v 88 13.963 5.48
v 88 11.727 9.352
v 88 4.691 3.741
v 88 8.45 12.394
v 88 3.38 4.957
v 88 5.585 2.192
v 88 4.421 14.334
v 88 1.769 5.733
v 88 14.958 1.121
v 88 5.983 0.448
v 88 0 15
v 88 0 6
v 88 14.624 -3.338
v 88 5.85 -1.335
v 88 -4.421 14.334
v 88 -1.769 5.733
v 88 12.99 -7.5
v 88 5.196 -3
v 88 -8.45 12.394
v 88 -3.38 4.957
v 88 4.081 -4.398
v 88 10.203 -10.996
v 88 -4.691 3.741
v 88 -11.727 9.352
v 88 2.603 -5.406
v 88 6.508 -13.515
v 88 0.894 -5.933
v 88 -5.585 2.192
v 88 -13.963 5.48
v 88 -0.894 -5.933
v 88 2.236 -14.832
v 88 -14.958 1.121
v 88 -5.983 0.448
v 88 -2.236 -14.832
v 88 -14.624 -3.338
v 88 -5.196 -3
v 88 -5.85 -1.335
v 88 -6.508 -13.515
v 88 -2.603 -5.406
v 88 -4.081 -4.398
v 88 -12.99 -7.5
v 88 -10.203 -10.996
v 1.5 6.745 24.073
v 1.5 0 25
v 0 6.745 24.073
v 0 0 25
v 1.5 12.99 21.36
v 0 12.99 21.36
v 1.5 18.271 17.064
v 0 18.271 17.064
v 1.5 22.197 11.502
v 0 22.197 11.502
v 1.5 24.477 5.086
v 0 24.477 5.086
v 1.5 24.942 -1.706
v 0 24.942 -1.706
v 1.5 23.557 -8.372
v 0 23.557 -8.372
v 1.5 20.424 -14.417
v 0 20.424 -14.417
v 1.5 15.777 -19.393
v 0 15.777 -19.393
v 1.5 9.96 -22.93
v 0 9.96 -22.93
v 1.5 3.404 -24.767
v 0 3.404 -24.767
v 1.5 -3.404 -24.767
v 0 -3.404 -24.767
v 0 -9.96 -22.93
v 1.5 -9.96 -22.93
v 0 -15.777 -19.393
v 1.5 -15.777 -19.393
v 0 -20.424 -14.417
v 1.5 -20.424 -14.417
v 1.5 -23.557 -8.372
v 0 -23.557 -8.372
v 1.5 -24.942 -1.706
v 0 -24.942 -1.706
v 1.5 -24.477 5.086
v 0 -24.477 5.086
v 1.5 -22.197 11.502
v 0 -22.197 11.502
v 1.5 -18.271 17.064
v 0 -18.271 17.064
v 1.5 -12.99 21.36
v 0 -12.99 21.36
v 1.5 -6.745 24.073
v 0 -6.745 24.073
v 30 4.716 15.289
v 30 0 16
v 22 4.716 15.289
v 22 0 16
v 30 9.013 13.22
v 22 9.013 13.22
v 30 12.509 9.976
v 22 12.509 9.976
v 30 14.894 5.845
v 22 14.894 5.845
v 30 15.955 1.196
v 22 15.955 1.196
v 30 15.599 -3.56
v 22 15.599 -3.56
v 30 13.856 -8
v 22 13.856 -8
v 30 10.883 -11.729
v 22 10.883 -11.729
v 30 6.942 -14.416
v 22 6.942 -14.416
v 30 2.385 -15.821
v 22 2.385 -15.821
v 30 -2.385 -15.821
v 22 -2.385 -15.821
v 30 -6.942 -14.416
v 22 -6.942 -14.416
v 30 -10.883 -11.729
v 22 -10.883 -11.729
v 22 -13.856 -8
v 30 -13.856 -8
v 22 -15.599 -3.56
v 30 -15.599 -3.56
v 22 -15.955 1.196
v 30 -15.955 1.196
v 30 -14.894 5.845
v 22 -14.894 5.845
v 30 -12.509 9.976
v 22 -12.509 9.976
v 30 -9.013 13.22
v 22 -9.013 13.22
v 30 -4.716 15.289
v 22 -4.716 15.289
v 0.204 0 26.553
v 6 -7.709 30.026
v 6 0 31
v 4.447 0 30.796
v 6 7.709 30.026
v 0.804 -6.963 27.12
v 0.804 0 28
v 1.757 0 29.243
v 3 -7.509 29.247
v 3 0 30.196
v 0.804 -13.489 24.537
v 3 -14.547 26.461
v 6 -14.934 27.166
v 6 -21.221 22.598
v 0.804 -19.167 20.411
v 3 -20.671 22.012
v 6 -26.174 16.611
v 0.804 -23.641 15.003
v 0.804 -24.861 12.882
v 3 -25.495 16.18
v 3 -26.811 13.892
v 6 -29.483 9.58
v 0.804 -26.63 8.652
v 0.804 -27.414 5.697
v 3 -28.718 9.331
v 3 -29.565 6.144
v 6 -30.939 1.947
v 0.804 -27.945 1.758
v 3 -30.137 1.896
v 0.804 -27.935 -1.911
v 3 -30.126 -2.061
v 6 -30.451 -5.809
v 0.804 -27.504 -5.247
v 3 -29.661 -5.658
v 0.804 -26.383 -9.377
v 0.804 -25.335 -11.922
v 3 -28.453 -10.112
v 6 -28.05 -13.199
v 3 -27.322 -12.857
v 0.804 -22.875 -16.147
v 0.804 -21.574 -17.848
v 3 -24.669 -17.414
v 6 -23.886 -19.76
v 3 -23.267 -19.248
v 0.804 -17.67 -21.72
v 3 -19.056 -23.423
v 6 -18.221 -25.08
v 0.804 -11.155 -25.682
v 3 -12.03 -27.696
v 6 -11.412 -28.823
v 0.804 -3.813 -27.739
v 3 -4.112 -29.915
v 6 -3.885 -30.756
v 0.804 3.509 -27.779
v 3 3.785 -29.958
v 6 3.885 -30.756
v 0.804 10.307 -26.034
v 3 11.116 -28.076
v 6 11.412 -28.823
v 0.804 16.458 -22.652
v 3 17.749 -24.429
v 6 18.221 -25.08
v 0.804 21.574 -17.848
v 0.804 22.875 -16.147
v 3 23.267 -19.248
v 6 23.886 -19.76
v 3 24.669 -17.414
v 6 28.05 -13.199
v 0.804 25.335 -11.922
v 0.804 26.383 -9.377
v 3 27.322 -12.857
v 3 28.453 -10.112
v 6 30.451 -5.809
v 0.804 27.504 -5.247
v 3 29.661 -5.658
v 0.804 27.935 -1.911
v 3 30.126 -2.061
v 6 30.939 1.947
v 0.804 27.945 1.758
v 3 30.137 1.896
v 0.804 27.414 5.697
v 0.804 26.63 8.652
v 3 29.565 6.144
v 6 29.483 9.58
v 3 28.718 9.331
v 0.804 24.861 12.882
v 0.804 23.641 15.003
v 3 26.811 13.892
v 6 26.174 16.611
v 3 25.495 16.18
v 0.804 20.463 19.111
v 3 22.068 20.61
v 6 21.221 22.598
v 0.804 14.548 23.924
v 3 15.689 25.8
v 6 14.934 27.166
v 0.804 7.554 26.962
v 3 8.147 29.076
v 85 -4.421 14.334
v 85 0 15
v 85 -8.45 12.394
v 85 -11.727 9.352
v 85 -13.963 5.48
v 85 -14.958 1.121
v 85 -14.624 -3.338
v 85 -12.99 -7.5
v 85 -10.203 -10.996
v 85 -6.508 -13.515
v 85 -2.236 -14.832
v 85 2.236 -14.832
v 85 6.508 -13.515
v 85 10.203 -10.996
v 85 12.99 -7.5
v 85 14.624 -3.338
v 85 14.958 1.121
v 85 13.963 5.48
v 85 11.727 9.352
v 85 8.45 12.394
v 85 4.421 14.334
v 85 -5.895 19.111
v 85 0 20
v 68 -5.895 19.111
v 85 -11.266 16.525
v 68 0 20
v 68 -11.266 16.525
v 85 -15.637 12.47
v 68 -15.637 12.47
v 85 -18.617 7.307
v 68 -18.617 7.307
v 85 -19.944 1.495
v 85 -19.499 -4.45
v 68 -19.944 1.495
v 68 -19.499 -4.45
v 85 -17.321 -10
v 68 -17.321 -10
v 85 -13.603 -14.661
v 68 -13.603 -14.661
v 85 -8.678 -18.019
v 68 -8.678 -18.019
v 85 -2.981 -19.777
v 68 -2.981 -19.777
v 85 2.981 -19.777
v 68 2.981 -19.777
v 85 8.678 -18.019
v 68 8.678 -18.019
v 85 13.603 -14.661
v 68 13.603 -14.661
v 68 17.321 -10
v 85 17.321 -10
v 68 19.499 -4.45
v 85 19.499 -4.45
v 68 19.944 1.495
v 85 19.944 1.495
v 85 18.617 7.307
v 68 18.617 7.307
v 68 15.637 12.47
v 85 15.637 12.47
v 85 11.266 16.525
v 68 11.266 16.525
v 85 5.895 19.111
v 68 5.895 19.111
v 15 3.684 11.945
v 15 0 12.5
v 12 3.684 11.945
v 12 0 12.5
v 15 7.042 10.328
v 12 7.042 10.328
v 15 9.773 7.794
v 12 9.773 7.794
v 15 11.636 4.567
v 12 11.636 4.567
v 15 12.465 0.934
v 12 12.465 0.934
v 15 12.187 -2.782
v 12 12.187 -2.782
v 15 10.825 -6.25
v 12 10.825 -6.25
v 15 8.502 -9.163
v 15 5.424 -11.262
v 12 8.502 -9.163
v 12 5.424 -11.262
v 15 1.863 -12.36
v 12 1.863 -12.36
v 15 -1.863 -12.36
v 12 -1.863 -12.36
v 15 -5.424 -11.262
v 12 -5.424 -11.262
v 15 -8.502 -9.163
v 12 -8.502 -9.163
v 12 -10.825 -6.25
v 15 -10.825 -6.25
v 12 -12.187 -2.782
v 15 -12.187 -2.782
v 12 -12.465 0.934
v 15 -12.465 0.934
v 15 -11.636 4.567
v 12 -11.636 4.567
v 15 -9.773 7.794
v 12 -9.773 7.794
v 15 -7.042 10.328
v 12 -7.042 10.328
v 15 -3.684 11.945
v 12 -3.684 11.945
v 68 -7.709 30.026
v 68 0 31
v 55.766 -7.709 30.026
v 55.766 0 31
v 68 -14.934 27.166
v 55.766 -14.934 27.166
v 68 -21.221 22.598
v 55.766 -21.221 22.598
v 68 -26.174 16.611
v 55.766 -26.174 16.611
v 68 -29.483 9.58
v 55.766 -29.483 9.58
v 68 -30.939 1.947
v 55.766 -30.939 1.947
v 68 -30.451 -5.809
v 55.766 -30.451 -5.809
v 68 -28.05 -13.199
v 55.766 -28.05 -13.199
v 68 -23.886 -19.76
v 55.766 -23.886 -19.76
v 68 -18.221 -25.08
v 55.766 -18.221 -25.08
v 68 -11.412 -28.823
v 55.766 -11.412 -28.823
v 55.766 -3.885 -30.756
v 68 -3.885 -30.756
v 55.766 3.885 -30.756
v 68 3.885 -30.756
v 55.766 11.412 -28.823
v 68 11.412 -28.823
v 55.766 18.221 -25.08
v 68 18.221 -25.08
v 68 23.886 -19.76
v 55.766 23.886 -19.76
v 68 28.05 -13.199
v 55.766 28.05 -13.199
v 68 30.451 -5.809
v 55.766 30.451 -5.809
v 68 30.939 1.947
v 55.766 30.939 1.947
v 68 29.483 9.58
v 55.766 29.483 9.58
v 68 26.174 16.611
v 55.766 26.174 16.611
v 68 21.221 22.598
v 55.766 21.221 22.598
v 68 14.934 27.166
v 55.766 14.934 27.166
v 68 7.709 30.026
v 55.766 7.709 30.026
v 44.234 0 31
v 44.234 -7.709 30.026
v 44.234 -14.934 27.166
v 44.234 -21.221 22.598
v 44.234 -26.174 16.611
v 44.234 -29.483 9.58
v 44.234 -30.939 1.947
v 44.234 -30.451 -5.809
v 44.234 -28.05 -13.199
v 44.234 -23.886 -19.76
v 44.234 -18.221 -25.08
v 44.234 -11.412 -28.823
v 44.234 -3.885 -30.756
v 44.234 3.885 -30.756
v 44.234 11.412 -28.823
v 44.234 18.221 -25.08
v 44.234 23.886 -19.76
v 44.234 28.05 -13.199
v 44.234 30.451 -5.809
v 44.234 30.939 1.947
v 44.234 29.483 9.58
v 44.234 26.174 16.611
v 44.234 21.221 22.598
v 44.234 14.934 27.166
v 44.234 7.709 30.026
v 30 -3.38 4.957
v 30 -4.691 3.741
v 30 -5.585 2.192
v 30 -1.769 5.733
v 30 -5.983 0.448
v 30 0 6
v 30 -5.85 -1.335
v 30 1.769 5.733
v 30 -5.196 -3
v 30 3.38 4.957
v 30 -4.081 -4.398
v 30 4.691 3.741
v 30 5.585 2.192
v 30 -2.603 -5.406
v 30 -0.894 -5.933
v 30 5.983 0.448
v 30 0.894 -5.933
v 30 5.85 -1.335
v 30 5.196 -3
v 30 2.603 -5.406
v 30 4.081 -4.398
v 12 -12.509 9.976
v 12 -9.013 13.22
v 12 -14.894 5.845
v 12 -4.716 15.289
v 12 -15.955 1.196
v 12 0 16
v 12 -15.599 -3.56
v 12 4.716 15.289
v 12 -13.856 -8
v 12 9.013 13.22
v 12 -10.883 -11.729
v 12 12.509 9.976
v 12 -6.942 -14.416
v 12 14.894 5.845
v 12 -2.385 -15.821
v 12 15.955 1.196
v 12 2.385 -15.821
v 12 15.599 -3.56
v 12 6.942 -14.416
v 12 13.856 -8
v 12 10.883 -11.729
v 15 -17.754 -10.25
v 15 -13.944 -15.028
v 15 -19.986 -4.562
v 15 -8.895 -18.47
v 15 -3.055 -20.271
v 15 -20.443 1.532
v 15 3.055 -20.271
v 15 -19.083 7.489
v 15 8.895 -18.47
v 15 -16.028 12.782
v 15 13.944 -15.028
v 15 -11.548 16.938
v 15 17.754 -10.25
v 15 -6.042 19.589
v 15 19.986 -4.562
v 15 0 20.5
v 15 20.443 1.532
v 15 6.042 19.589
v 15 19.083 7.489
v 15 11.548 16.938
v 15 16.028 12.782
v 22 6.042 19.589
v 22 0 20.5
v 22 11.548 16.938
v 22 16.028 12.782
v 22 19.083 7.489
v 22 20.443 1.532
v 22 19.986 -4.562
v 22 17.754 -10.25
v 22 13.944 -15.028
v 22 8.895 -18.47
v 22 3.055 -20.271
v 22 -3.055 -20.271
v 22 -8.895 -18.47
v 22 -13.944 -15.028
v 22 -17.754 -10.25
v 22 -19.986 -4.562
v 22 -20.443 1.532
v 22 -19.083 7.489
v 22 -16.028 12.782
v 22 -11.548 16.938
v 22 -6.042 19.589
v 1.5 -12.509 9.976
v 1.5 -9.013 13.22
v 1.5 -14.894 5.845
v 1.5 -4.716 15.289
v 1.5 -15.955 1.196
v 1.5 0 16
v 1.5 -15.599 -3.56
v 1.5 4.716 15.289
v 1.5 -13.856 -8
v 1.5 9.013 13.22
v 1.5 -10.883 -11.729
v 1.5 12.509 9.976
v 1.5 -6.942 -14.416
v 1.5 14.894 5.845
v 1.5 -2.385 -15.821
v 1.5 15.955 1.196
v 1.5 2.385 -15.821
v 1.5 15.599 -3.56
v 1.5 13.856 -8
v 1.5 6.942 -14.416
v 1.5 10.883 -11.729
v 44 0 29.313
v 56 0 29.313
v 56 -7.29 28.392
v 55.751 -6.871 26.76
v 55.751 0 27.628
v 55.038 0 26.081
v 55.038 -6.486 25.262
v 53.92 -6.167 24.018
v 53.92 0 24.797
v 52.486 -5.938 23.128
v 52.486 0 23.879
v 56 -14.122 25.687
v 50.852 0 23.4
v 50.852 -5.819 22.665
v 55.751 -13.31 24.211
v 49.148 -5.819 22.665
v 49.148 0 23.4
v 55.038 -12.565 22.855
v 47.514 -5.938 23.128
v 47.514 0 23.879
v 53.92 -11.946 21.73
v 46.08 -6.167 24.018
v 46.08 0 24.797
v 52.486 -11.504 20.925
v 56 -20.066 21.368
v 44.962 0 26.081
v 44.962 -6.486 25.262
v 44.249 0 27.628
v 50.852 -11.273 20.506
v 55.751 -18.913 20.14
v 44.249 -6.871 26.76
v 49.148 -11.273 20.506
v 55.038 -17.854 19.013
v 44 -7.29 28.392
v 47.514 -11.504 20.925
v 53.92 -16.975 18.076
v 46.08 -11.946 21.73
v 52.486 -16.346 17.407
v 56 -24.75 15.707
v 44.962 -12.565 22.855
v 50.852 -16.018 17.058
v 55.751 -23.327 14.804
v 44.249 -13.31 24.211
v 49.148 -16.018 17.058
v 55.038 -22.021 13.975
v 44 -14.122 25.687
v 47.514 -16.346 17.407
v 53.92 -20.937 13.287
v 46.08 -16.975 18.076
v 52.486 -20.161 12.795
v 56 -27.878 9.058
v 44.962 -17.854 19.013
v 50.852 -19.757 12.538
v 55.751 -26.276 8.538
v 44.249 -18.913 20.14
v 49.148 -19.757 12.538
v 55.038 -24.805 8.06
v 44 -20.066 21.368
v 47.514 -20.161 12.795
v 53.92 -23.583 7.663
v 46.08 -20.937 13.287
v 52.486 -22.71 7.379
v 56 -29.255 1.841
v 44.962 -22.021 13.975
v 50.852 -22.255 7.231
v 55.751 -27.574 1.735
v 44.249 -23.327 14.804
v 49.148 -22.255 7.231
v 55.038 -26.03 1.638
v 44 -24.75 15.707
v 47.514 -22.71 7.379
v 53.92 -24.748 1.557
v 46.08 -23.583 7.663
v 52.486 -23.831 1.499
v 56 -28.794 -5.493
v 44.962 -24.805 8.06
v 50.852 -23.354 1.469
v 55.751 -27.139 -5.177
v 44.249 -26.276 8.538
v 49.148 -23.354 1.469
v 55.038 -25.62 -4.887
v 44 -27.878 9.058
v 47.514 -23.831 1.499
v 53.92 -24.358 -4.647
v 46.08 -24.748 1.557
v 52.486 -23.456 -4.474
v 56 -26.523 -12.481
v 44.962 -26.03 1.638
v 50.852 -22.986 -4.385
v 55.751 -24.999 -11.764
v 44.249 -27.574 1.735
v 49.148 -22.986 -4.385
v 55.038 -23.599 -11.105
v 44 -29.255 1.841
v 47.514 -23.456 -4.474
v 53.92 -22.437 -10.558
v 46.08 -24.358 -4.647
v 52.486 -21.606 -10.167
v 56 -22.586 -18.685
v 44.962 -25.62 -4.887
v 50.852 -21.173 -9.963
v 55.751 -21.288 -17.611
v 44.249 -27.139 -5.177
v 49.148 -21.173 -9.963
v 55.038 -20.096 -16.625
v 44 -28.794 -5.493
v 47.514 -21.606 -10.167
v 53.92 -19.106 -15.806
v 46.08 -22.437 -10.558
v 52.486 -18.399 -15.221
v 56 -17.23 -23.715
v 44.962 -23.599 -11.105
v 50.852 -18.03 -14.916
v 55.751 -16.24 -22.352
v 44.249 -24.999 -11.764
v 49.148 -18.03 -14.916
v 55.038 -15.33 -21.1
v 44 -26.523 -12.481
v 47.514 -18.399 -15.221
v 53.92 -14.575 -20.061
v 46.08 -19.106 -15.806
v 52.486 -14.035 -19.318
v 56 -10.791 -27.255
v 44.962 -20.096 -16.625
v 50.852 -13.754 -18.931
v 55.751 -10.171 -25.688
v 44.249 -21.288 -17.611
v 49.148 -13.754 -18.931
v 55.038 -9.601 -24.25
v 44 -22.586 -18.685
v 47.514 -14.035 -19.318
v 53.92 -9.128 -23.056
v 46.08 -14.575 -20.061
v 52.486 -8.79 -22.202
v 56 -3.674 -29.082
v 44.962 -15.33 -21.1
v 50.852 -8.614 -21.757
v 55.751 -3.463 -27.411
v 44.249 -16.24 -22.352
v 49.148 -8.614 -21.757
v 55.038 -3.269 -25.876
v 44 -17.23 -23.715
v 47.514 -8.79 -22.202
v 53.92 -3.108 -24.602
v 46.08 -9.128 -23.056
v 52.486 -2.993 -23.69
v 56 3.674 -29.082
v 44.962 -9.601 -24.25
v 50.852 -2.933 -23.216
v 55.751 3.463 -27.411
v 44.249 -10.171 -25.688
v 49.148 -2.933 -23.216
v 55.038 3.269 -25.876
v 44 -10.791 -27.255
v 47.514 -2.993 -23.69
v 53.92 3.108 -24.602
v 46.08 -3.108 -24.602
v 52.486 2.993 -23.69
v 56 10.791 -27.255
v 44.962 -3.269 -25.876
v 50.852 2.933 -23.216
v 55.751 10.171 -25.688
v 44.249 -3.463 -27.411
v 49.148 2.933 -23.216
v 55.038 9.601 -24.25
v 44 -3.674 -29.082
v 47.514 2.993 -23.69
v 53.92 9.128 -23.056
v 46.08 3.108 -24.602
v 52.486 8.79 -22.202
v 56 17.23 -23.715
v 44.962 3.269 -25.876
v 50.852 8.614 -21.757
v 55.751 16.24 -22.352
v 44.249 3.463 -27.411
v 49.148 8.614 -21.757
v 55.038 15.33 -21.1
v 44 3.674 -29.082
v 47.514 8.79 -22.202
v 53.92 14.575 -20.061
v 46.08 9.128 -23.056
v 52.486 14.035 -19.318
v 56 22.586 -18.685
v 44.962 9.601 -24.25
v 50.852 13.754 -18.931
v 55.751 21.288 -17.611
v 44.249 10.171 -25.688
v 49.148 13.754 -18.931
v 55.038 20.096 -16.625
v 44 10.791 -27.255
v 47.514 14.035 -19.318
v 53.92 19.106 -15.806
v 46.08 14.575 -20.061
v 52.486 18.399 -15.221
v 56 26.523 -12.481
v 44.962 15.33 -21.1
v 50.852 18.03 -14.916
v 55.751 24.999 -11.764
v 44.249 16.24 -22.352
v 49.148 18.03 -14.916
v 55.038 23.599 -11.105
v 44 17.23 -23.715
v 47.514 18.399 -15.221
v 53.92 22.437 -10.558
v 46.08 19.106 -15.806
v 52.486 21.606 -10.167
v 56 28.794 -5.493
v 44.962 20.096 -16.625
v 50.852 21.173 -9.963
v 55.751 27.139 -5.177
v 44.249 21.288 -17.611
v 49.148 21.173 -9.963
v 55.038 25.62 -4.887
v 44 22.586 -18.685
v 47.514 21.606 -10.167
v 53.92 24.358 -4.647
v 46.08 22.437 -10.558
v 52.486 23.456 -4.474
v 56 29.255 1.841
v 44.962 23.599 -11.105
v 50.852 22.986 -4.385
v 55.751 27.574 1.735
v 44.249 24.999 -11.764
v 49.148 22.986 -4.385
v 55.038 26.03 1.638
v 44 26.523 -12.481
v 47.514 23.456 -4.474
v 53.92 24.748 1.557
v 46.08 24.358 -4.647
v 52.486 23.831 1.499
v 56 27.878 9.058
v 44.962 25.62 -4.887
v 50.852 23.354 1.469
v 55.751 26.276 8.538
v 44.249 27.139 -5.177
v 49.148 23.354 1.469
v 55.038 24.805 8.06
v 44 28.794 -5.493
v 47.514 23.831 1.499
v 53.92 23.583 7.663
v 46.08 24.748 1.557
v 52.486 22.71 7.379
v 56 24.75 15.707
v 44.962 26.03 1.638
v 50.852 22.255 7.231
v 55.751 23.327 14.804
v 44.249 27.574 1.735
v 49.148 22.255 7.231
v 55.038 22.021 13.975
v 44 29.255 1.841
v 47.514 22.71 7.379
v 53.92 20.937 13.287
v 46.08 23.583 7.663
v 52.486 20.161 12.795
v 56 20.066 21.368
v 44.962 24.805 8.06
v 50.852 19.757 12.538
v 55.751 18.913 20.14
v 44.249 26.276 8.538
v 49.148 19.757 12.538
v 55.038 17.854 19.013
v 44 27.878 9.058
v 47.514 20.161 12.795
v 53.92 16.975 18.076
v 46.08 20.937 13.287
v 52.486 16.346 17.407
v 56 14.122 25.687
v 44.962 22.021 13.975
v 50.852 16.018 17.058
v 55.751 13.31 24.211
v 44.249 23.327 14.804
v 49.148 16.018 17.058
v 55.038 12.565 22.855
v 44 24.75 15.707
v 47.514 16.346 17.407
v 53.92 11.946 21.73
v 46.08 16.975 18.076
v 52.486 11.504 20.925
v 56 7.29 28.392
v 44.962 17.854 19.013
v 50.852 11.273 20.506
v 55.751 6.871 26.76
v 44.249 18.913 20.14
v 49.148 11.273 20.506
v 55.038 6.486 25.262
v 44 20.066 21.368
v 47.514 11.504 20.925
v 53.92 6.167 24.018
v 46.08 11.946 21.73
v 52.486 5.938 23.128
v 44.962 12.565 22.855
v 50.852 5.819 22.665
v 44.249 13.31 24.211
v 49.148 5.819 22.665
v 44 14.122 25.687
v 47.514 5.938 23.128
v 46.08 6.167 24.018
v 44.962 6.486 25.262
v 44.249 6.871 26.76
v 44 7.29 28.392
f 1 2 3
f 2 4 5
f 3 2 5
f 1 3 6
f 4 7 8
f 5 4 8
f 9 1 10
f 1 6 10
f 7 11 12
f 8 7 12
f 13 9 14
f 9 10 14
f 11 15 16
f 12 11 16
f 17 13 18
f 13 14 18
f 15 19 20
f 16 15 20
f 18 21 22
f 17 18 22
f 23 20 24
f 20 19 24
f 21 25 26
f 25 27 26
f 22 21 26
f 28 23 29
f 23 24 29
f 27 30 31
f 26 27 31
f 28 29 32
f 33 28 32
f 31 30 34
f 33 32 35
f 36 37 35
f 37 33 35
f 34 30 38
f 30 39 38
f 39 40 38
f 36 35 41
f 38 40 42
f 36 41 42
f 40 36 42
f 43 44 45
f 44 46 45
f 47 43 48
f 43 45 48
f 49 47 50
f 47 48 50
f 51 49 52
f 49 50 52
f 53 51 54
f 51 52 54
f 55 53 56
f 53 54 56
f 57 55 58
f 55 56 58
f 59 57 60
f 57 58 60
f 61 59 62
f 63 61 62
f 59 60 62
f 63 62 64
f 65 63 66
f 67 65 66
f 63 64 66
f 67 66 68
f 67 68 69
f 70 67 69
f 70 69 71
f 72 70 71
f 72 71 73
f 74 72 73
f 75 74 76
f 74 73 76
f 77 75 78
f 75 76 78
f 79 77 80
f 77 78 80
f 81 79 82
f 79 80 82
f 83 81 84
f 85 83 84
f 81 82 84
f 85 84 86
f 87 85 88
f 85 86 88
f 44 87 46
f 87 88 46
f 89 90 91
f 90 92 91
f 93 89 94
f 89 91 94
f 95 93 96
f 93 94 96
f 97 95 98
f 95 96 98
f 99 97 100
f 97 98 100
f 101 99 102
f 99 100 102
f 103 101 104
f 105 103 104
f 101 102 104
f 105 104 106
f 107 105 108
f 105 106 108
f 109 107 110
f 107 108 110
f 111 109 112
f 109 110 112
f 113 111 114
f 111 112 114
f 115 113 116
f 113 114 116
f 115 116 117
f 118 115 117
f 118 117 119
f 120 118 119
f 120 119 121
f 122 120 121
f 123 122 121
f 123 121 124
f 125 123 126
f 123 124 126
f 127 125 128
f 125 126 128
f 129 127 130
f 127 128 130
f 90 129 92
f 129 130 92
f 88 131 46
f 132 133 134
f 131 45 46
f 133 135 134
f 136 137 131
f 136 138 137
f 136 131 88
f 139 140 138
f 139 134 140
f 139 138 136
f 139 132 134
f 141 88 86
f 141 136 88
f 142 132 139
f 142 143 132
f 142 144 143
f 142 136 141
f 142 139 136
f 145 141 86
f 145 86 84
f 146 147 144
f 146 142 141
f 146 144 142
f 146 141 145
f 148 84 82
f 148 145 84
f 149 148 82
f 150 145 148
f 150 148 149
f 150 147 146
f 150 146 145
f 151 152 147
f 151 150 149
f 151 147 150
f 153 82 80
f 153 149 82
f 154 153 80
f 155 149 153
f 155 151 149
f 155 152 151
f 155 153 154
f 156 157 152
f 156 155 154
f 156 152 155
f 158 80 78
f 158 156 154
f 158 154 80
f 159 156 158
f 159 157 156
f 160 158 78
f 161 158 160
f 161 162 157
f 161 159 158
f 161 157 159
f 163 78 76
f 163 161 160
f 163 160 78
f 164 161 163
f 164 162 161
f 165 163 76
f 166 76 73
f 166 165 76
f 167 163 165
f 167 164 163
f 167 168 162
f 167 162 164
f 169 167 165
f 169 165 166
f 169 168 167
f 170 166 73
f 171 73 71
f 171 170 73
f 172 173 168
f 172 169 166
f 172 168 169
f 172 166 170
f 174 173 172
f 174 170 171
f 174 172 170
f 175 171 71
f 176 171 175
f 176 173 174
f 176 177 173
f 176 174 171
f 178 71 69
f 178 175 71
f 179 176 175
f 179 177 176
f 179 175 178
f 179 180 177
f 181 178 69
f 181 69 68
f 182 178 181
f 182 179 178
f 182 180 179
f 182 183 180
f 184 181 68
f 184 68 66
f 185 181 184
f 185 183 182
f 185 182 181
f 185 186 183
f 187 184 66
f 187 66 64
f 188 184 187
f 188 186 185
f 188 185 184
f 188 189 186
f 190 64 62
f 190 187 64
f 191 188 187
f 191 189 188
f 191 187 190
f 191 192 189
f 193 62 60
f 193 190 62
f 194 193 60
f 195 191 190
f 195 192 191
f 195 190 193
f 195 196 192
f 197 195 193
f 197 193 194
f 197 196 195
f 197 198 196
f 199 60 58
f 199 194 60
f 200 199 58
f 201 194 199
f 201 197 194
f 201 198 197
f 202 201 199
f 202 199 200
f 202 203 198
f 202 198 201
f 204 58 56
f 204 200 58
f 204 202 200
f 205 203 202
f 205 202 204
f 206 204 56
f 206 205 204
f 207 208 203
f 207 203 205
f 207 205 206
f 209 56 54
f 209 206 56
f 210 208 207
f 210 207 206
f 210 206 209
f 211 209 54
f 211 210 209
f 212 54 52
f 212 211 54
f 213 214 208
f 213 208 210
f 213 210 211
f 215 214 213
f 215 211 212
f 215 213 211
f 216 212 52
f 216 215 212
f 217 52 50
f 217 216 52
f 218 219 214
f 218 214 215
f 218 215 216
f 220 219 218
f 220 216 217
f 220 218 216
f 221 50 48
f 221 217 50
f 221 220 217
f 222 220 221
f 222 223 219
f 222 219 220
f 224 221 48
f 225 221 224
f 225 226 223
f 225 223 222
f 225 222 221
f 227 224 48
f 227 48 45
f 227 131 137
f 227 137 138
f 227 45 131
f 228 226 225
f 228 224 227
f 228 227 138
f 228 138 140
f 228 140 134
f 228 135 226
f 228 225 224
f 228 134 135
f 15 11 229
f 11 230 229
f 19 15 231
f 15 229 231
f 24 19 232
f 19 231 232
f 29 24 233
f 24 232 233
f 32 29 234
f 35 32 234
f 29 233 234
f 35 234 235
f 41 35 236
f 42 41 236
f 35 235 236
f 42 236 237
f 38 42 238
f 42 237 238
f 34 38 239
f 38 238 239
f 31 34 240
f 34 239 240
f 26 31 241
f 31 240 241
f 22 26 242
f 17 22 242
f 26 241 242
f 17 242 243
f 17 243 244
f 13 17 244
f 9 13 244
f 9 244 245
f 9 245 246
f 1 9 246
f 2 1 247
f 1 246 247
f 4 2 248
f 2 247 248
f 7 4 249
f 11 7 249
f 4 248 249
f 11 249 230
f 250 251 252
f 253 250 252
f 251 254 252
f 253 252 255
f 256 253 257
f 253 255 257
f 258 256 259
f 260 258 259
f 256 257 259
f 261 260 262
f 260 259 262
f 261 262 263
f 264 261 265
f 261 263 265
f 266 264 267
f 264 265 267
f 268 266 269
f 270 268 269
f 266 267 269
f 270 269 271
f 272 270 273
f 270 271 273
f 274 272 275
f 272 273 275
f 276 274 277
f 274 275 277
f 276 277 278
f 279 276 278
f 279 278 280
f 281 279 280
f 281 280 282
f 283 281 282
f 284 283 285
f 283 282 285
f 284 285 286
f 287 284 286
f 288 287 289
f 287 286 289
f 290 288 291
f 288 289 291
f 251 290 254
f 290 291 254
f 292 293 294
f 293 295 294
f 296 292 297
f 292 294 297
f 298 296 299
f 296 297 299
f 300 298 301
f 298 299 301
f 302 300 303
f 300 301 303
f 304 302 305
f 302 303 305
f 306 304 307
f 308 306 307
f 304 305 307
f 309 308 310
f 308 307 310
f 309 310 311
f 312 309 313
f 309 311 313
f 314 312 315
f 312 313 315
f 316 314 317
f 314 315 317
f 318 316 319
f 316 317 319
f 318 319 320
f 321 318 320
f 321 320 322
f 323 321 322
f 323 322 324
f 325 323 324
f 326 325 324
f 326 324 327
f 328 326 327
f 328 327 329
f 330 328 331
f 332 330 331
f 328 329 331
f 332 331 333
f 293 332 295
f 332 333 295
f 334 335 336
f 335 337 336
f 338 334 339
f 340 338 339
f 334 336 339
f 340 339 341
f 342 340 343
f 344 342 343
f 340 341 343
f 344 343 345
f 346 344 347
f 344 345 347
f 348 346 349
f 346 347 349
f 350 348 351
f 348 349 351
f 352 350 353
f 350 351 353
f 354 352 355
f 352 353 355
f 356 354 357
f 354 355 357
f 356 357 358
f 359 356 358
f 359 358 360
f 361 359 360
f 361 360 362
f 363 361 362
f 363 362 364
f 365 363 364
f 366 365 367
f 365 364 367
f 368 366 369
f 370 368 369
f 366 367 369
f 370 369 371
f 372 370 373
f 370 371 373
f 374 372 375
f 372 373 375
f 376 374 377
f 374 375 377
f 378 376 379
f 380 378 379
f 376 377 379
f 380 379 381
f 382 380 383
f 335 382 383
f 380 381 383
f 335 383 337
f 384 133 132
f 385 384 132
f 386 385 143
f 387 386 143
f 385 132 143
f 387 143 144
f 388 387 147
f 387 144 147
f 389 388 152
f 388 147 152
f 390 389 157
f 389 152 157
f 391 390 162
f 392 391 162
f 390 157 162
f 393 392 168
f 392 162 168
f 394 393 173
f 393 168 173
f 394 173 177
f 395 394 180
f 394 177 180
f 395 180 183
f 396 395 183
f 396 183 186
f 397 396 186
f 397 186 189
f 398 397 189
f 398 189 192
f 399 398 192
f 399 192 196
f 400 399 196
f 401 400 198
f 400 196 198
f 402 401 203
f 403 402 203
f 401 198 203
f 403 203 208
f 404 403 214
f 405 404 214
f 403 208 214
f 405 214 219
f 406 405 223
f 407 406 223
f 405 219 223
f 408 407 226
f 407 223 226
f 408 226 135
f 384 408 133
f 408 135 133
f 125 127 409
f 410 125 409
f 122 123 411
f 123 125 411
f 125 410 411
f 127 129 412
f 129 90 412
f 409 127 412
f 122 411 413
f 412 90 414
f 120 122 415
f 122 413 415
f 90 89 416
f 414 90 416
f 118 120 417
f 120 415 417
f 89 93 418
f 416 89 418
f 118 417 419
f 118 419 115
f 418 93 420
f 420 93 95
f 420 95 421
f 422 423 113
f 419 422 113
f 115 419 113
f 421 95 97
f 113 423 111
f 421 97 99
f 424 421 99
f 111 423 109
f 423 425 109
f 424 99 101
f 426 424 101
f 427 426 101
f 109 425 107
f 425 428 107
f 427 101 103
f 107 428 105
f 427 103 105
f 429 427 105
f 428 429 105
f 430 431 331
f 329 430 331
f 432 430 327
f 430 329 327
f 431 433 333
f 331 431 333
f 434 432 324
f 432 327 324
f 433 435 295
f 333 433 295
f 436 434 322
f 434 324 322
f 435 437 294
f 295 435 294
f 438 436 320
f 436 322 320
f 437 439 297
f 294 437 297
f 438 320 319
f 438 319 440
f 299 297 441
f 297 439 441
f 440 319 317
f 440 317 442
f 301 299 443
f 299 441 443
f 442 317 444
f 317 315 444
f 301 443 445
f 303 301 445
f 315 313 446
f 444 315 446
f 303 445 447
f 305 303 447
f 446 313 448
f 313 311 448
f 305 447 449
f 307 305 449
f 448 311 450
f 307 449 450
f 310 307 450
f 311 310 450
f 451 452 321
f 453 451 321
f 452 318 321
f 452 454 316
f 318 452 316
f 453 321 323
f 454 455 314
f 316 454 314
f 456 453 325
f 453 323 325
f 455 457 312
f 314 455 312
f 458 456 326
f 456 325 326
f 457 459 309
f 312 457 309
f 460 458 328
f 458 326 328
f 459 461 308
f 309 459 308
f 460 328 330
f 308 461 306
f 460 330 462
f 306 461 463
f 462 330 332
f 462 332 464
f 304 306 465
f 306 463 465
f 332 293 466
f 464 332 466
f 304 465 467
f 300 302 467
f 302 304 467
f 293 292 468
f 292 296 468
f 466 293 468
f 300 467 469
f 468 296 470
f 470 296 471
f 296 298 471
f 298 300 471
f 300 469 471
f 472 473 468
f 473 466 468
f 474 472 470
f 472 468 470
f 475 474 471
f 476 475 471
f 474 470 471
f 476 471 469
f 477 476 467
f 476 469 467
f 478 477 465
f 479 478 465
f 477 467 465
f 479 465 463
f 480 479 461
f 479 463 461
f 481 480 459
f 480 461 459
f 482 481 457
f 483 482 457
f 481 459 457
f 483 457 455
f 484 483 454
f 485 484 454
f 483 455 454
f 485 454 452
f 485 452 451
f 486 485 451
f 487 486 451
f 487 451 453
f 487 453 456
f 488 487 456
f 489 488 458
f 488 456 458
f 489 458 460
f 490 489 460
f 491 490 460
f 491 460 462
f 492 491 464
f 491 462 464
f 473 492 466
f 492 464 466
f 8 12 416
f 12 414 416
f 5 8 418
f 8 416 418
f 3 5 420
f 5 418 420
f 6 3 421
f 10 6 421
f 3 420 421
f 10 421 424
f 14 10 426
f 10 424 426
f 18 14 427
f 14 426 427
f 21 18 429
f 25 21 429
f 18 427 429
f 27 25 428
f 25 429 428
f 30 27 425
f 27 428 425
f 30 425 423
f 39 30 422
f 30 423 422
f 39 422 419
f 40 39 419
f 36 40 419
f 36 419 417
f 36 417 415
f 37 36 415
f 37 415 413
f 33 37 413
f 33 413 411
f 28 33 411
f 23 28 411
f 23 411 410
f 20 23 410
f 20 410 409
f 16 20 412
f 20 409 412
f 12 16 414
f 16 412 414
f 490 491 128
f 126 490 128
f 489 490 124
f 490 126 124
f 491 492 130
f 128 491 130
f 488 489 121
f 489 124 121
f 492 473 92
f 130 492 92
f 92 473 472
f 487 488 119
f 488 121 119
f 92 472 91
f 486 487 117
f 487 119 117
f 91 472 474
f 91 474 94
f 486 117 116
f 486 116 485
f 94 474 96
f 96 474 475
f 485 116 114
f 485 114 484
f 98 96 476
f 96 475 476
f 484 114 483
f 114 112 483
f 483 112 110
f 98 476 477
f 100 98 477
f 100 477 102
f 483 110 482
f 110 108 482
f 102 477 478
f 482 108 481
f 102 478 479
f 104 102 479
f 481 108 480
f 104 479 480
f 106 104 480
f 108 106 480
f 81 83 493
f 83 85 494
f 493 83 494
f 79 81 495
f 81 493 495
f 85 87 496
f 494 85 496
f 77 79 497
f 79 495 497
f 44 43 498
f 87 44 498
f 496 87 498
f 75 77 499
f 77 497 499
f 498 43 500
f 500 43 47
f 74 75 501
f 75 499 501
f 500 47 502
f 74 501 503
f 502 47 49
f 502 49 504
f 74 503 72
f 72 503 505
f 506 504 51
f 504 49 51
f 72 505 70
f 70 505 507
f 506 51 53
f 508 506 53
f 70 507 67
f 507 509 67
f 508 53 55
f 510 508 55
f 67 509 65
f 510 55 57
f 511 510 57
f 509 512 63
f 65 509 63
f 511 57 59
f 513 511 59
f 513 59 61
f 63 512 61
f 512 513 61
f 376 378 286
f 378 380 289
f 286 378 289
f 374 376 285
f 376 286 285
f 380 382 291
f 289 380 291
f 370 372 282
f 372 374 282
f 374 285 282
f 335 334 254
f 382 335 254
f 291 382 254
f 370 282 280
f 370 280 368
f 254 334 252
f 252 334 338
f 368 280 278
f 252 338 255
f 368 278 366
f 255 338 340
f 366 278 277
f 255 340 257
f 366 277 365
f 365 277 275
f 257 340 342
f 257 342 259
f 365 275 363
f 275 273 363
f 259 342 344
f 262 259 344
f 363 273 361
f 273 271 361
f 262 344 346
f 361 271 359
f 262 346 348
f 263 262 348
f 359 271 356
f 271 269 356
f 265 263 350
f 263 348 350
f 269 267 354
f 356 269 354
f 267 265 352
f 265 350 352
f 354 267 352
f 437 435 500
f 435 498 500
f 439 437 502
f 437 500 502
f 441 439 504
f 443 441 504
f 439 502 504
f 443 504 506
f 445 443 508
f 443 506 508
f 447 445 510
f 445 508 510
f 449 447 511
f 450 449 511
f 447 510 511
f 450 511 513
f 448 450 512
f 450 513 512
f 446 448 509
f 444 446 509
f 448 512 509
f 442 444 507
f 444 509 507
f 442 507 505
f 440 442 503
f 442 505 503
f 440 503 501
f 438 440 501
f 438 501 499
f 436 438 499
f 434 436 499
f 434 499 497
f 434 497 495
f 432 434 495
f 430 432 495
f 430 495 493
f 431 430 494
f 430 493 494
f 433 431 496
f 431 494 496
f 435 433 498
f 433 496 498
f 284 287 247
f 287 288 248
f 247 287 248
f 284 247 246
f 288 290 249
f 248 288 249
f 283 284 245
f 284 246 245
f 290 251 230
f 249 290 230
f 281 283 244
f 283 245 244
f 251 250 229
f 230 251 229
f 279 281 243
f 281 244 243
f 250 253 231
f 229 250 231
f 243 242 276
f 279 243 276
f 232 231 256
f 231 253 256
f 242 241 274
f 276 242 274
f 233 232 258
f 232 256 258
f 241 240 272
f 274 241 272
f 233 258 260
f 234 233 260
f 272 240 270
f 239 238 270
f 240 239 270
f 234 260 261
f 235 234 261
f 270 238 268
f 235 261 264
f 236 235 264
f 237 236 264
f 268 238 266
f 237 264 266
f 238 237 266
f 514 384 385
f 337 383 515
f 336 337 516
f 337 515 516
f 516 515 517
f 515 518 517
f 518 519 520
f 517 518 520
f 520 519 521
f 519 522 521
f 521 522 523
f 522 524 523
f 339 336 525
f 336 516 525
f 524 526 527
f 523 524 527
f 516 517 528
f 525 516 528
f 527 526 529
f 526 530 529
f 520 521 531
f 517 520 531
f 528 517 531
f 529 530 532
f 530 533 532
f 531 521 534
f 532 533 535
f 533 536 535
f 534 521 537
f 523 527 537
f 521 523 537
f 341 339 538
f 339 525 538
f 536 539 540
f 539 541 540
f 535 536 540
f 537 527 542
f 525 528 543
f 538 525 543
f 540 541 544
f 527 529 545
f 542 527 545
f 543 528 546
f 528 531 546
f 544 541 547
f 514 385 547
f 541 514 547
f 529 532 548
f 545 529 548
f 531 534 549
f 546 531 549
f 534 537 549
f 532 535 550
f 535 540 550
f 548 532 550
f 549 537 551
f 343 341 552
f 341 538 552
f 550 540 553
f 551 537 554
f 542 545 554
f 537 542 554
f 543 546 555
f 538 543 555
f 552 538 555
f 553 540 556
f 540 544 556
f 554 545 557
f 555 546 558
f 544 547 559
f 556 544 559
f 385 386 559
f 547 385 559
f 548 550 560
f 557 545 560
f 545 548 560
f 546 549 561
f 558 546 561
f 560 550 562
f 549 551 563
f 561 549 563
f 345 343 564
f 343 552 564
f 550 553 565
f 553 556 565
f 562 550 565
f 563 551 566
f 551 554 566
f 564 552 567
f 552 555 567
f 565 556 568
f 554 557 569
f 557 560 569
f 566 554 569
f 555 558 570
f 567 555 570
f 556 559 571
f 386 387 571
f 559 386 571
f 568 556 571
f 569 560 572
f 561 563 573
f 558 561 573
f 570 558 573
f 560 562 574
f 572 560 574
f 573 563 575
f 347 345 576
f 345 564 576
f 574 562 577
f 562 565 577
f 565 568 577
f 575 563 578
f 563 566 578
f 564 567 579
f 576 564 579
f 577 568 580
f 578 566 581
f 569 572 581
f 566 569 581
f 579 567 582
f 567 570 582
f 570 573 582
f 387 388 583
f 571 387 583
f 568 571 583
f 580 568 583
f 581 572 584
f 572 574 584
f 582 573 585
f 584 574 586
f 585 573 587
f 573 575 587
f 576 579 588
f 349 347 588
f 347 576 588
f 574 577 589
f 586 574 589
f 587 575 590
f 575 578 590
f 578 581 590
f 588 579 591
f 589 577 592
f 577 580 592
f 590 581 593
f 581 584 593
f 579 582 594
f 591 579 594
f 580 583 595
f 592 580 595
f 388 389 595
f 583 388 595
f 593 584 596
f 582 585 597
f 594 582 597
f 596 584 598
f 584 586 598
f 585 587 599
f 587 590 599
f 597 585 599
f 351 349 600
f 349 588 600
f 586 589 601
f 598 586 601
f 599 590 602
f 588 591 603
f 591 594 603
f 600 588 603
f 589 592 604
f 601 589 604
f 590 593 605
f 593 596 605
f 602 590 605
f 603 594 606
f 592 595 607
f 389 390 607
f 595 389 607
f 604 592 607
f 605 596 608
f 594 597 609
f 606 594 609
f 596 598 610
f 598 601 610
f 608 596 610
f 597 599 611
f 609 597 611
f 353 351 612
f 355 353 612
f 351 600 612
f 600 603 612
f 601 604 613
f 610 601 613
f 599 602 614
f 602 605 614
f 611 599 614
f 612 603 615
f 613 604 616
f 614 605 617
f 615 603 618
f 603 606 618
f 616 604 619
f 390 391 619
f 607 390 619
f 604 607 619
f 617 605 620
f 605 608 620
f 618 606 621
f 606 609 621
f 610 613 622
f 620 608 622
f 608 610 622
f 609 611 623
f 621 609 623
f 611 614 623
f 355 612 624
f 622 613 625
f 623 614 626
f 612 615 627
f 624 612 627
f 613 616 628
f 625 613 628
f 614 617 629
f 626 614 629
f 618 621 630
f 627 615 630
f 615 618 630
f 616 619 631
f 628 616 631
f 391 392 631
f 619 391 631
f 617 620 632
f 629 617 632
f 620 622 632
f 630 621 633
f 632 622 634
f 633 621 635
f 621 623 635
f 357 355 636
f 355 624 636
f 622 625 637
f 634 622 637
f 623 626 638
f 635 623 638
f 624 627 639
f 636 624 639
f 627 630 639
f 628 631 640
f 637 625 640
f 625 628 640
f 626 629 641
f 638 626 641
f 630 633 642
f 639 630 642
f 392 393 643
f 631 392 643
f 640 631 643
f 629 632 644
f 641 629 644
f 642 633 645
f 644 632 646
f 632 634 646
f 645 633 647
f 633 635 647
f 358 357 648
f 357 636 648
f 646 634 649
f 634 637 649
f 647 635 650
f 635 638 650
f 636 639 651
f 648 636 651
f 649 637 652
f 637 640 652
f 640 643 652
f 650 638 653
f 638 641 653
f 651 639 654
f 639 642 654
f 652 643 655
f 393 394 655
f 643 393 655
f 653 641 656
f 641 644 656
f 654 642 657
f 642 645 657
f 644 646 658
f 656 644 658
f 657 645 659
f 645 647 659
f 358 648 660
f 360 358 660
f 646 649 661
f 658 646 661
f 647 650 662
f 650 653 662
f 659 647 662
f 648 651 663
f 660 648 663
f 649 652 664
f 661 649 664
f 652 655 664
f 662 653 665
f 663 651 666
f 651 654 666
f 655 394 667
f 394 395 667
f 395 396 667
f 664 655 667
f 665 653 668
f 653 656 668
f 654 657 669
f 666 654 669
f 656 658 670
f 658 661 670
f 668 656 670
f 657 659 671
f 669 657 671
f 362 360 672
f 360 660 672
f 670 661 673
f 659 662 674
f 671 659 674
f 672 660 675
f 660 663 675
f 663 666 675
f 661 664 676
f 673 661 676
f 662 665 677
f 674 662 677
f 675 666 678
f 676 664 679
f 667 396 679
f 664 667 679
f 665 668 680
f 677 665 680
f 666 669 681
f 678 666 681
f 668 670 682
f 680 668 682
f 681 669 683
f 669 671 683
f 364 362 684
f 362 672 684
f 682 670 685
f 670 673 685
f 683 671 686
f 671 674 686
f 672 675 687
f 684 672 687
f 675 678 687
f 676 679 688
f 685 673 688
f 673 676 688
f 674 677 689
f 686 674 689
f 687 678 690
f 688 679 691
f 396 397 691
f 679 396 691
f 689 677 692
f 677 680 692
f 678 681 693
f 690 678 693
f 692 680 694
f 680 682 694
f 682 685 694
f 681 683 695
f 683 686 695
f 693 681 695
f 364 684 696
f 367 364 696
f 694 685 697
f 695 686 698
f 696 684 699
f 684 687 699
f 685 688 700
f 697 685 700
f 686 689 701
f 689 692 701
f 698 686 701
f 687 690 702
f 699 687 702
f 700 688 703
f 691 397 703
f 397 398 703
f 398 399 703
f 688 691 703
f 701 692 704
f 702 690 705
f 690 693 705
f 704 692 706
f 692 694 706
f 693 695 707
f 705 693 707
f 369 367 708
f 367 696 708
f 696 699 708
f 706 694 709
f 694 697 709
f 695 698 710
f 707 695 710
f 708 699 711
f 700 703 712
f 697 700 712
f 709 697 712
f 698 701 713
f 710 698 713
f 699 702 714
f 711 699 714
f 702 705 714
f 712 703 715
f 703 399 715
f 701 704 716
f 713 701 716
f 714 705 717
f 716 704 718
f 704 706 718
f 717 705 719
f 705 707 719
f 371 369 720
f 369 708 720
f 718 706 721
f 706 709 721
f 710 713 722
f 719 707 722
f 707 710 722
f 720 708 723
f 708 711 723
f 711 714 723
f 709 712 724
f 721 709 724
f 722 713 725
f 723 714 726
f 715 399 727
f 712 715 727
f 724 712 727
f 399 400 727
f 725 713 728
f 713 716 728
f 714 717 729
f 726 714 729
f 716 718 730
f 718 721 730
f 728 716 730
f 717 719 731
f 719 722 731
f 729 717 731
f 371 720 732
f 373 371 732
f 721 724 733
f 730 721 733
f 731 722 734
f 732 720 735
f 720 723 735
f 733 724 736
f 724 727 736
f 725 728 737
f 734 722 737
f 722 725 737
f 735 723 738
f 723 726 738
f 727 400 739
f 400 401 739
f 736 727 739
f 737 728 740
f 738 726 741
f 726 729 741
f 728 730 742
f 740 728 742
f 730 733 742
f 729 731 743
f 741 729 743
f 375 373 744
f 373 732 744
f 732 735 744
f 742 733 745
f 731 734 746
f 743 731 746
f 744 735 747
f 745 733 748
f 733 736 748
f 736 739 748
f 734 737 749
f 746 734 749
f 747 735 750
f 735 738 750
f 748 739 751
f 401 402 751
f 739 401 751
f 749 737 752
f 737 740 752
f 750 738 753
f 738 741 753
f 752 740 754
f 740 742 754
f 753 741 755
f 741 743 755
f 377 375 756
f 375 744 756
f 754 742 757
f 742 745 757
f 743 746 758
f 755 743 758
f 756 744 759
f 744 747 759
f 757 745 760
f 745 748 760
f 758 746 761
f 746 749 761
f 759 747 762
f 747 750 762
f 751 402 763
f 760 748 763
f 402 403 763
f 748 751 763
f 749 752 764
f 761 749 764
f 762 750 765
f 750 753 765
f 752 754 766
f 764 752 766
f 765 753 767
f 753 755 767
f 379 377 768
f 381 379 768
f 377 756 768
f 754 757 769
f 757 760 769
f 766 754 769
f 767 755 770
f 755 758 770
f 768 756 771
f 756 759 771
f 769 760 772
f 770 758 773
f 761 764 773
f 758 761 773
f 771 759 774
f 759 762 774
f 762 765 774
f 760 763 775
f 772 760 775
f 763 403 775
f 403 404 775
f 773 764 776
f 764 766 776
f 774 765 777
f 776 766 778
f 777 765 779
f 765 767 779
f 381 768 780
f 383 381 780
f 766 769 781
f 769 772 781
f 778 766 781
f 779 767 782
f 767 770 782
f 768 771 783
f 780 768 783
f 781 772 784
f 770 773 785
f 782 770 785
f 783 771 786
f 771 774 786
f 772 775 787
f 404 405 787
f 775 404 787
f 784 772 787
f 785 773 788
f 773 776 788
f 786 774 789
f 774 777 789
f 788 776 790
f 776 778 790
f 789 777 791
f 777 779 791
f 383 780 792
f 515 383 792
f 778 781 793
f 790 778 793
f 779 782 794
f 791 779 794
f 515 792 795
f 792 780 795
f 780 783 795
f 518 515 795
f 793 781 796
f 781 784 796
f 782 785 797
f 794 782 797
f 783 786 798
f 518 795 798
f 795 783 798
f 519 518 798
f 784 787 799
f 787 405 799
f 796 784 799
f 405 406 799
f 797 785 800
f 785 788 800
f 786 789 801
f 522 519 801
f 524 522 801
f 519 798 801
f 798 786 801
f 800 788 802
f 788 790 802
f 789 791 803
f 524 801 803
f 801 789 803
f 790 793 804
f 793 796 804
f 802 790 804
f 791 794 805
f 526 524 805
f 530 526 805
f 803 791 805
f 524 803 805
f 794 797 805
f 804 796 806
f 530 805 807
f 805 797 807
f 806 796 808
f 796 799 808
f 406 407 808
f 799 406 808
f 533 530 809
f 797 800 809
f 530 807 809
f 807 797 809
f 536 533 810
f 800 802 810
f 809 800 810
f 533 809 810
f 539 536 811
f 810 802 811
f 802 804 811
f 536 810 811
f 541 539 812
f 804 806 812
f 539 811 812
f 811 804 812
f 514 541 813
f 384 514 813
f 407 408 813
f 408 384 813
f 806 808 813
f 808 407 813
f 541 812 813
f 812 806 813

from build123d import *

# Parameters (mm, degrees)
F4_R = 5.99999


# Not quite as in the source:
# - a fillet or chamfer is up to 0.001 mm smaller than in the source, because OpenCascade refuses the exact size


with BuildPart() as f1:
    # F0 (on Front) → F1 (revolve)
    with BuildSketch(Plane.XZ):
        with BuildLine():
            Line((0, 31), (0, 0))
            Line((0, 0), (88, 0))
            Line((88, 0), (88, 15))
            Line((88, 15), (85, 15))
            Line((85, 15), (85, 20))
            Line((85, 20), (68, 20))
            Line((68, 20), (68, 31))
            Line((68, 31), (55.7656139637, 31))
            ThreePointArc((55.7656139637, 31), (50, 23.3393689087), (44.2343860363, 31))
            Line((44.2343860363, 31), (0, 31))
        make_face()
    revolve(axis=Axis((85.9634177689, 0, 0), (1, 0, 0)))

    # F2 (on Front) → F3 (revolve, cut)
    with BuildSketch(Plane.XZ):
        Polygon((0, 25), (0, 0), (88, 0), (88, 6), (30, 6), (30, 12.5), (30, 16), (22, 16), (22, 20.5), (15, 20.5), (15, 12.5), (12, 12.5), (12, 16), (1.5, 16), (1.5, 25), align=None)
    revolve(axis=Axis((-10.4486994627, 0, 0), (-1, 0, 0)), mode=Mode.SUBTRACT)

    # F4 (radius 6 in the source; OpenCascade refuses exactly that, so slightly less here)
    f4_edges = [f1.edges().sort_by_distance(p)[0] for p in [
        (0, 0, -31),
    ]]
    fillet(f4_edges, radius=F4_R)


solid = f1.part
